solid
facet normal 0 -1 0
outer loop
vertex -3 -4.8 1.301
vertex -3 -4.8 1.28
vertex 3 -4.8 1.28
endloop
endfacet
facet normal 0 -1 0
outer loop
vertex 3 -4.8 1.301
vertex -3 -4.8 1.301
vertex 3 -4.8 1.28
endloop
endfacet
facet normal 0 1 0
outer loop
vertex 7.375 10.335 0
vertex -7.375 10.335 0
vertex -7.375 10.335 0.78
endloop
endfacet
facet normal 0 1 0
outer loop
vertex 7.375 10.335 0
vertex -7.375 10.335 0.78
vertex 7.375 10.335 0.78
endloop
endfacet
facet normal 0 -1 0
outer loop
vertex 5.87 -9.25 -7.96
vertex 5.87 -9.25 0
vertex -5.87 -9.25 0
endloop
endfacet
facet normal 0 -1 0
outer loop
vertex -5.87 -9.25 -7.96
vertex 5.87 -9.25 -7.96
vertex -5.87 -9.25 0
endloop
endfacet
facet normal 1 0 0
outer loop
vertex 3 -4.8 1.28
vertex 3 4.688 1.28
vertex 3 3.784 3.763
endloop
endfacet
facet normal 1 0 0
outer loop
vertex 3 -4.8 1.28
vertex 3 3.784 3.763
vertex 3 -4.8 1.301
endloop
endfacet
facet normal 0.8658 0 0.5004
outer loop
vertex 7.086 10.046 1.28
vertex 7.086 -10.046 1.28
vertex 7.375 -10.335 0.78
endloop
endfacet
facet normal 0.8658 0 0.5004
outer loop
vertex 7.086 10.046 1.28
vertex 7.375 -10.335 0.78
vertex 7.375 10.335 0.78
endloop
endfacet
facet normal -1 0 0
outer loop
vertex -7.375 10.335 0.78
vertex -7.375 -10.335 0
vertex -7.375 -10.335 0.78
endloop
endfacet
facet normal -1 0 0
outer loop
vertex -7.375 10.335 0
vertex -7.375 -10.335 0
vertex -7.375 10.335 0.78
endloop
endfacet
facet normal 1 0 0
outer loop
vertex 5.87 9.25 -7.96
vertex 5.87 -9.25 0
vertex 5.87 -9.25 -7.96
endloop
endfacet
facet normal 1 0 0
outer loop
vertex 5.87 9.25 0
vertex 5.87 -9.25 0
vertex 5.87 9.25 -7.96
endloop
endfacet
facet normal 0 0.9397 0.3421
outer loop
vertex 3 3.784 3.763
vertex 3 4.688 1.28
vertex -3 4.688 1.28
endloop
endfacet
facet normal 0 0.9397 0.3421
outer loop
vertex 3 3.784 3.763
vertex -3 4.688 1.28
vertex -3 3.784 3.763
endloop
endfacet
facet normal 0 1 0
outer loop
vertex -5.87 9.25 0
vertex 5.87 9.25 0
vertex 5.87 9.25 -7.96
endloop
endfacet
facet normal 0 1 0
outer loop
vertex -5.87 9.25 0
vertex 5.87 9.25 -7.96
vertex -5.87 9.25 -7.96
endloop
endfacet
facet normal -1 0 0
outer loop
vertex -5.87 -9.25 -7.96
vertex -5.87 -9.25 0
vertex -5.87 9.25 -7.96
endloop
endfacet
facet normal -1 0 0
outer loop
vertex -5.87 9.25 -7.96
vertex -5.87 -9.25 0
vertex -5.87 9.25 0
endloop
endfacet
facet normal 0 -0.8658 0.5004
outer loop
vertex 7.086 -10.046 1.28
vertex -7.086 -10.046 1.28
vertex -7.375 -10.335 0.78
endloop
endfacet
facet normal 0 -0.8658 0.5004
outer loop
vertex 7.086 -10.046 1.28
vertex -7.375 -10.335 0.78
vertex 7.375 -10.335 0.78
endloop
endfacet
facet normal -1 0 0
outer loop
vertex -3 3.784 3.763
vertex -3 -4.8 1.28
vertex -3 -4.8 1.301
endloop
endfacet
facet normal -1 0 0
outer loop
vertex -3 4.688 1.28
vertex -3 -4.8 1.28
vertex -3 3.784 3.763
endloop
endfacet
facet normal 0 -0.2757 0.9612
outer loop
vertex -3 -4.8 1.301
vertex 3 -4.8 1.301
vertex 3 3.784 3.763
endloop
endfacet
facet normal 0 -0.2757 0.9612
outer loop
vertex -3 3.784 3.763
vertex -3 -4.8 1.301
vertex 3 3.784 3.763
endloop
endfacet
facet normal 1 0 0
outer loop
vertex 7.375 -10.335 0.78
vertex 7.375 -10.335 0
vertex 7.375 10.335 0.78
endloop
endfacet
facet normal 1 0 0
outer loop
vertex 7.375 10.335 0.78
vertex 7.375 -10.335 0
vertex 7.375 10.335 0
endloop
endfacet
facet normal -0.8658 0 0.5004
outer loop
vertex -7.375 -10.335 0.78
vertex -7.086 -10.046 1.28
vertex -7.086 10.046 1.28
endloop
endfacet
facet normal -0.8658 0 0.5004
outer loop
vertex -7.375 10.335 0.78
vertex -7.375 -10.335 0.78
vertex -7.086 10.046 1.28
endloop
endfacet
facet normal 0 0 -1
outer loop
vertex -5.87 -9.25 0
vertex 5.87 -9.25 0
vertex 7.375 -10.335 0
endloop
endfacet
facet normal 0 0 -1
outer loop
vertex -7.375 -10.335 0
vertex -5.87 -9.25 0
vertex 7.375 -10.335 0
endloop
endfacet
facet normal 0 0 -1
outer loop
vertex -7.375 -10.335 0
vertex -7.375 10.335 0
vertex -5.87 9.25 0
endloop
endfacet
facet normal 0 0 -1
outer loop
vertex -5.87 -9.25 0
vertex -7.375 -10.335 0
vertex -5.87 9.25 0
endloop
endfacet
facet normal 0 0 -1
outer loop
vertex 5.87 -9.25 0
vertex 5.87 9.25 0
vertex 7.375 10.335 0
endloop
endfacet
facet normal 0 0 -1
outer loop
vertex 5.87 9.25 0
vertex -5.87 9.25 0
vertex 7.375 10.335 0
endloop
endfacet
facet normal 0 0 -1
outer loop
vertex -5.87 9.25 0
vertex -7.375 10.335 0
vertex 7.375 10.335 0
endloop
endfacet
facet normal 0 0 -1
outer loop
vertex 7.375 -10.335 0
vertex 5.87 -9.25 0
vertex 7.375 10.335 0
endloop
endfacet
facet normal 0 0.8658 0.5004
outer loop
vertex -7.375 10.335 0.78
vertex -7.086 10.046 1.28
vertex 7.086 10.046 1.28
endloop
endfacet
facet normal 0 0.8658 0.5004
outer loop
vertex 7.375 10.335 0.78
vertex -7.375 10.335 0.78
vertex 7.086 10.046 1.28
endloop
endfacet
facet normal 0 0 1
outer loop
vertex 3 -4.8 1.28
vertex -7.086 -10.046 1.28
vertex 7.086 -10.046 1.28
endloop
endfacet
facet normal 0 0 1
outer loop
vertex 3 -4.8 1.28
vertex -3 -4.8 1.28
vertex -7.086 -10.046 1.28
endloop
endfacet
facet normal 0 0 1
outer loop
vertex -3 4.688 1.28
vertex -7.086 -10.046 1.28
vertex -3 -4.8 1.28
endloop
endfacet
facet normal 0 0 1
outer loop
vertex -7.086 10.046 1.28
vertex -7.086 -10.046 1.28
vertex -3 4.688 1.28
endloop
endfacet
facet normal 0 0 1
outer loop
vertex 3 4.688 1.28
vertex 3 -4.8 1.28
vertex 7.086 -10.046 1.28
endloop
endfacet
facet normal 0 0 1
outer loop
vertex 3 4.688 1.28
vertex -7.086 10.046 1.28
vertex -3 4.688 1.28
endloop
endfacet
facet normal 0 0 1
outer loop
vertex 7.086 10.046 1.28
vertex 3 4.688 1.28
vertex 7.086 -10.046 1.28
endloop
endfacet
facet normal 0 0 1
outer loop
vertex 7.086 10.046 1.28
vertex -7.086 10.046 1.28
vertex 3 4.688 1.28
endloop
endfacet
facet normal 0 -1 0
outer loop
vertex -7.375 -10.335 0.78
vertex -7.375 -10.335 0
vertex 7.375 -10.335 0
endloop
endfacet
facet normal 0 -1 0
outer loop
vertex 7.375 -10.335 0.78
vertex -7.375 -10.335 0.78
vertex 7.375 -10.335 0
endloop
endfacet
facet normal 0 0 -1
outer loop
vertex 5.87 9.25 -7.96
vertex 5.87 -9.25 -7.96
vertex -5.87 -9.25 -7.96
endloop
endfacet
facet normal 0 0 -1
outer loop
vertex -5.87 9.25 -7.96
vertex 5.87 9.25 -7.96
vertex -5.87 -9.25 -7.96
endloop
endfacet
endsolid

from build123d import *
from OCP.BRepFilletAPI import BRepFilletAPI_MakeChamfer

# Parameters (mm, degrees)
SKETCH_1_W       = 14.75
SKETCH_1_H       = 20.67
EXTRUDE_1_DEPTH  = 1.28
EXTRUDE_2_DEPTH  = 3
CHAMFER_3_SIZE   = 2
CHAMFER_3_SIZE_2 = 11.342563639
CHAMFER_4_SIZE   = 0.5
CHAMFER_4_SIZE2  = 0.288675135
CHAMFER_5_SIZE   = 3
CHAMFER_5_SIZE_2 = 1.041889066
CHAMFER_6_SIZE   = 0.978668112
CHAMFER_6_SIZE_2 = 9
SKETCH_3_W       = 11.74
SKETCH_3_H       = 18.5
EXTRUDE_3_DEPTH  = 7.96


with BuildPart() as part:
    # 草图1 → 凸台-拉伸1 (new body)
    with BuildSketch(Plane.XY):
        Rectangle(SKETCH_1_W, SKETCH_1_H)
    extrude(amount=EXTRUDE_1_DEPTH)

    # 草图2 → 凸台-拉伸2 (add)
    with BuildSketch(Plane.XY.offset(1.28)):
        Polygon((0, -4.8), (-3, -4.8), (-3, 4.8), (3, 4.8), (3, -4.8), align=None)
    extrude(amount=EXTRUDE_2_DEPTH)

    # 倒角3
    # the kernel refuses this chamfer: 11.342563639, 2 mm, written as the material it takes off along each edge
    with BuildSketch(Plane(origin=(32.474091667, -4.8, 4.28), x_dir=(0, -0.21013876076743543, -0.9776715712462578), z_dir=(-1, 0, 0))) as chamfer_3_piece_1:
        Polygon((CHAMFER_3_SIZE * 0.977671571246, -CHAMFER_3_SIZE * 0.210138760767), (-CHAMFER_3_SIZE_2 * 0.210138760772, -CHAMFER_3_SIZE_2 * 0.977671571267), (0, 0), align=None)
    extrude(amount=64.948183335, mode=Mode.SUBTRACT)

    # 倒角4: one chamfer whose edges measure the first distance from different faces: ONE call of the kernel's chamfer builder (chamfer() names one face for all edges)
    chamfer_4_edges_1 = [part.edges().sort_by_distance(p)[0] for p in [
        (7.375, 0, 1.28),
    ]]
    chamfer_4_side_1 = [part.faces().sort_by_distance(p)[0] for p in [
        (7.375, 0, 0.64),
    ]]
    chamfer_4_edges_2 = [part.edges().sort_by_distance(p)[0] for p in [
        (0, 10.335, 1.28),
    ]]
    chamfer_4_side_2 = [part.faces().sort_by_distance(p)[0] for p in [
        (0, 10.335, 0.64),
    ]]
    chamfer_4_edges_3 = [part.edges().sort_by_distance(p)[0] for p in [
        (-7.375, 0, 1.28),
    ]]
    chamfer_4_side_3 = [part.faces().sort_by_distance(p)[0] for p in [
        (-7.375, 0, 0.64),
    ]]
    chamfer_4_edges_4 = [part.edges().sort_by_distance(p)[0] for p in [
        (0, -10.335, 1.28),
    ]]
    chamfer_4_side_4 = [part.faces().sort_by_distance(p)[0] for p in [
        (0, -10.335, 0.64),
    ]]
    chamfer_4 = BRepFilletAPI_MakeChamfer(part.part.solid().wrapped)
    for e in chamfer_4_edges_1:
        chamfer_4.Add(CHAMFER_4_SIZE, CHAMFER_4_SIZE2, e.wrapped, chamfer_4_side_1[0].wrapped)  # the first distance lies on this face
    for e in chamfer_4_edges_2:
        chamfer_4.Add(CHAMFER_4_SIZE, CHAMFER_4_SIZE2, e.wrapped, chamfer_4_side_2[0].wrapped)  # the first distance lies on this face
    for e in chamfer_4_edges_3:
        chamfer_4.Add(CHAMFER_4_SIZE, CHAMFER_4_SIZE2, e.wrapped, chamfer_4_side_3[0].wrapped)  # the first distance lies on this face
    for e in chamfer_4_edges_4:
        chamfer_4.Add(CHAMFER_4_SIZE, CHAMFER_4_SIZE2, e.wrapped, chamfer_4_side_4[0].wrapped)  # the first distance lies on this face
    add(Compound.cast(chamfer_4.Shape()), mode=Mode.REPLACE)

    # 倒角5
    # the kernel refuses this chamfer: 3, 1.041889066 mm, written as the material it takes off along each edge
    with BuildSketch(Plane(origin=(10.782584198, 4.8, 3.972739015), x_dir=(0, 0.013184058198646008, -0.9999130865277315), z_dir=(-1, 0, 0))) as chamfer_5_piece_1_section:
        Polygon((CHAMFER_5_SIZE * 0.999913086528, CHAMFER_5_SIZE * 0.0131840581986), (CHAMFER_5_SIZE_2 * 0.160649322571, CHAMFER_5_SIZE_2 * 0.987011547633), (0, 0), align=None)
    chamfer_5_piece_1 = extrude(amount=21.565168395, mode=Mode.PRIVATE)
    chamfer_5_piece_1 = split(chamfer_5_piece_1, bisect_by=Plane(origin=(0, 4.454539571, 1.28), z_dir=(0, 0, 1)), keep=Keep.TOP, mode=Mode.PRIVATE)
    add(chamfer_5_piece_1, mode=Mode.SUBTRACT)

    # 倒角6
    # the kernel refuses this chamfer: 9, 0.978668112 mm, written as the material it takes off along each edge
    with BuildSketch(Plane(origin=(26.395258852, -4.8, 2.28), x_dir=(0, -0.30567862025886394, -0.952134749453373), z_dir=(-1, 0, 0))) as chamfer_6_piece_1:
        Polygon((CHAMFER_6_SIZE * 0.952134749764, -CHAMFER_6_SIZE * 0.305678620359), (-CHAMFER_6_SIZE_2 * 0.466371139297, -CHAMFER_6_SIZE_2 * 0.884589147814), (0, 0), align=None)
    extrude(amount=52.790517704, mode=Mode.SUBTRACT)

    # 草图3 → 凸台-拉伸3 (add)
    with BuildSketch(Plane(origin=(0, 0, 0), x_dir=(-1, 0, 0), z_dir=(0, 0, -1))):
        Rectangle(SKETCH_3_W, SKETCH_3_H)
    extrude(amount=EXTRUDE_3_DEPTH)


solid = part.part
